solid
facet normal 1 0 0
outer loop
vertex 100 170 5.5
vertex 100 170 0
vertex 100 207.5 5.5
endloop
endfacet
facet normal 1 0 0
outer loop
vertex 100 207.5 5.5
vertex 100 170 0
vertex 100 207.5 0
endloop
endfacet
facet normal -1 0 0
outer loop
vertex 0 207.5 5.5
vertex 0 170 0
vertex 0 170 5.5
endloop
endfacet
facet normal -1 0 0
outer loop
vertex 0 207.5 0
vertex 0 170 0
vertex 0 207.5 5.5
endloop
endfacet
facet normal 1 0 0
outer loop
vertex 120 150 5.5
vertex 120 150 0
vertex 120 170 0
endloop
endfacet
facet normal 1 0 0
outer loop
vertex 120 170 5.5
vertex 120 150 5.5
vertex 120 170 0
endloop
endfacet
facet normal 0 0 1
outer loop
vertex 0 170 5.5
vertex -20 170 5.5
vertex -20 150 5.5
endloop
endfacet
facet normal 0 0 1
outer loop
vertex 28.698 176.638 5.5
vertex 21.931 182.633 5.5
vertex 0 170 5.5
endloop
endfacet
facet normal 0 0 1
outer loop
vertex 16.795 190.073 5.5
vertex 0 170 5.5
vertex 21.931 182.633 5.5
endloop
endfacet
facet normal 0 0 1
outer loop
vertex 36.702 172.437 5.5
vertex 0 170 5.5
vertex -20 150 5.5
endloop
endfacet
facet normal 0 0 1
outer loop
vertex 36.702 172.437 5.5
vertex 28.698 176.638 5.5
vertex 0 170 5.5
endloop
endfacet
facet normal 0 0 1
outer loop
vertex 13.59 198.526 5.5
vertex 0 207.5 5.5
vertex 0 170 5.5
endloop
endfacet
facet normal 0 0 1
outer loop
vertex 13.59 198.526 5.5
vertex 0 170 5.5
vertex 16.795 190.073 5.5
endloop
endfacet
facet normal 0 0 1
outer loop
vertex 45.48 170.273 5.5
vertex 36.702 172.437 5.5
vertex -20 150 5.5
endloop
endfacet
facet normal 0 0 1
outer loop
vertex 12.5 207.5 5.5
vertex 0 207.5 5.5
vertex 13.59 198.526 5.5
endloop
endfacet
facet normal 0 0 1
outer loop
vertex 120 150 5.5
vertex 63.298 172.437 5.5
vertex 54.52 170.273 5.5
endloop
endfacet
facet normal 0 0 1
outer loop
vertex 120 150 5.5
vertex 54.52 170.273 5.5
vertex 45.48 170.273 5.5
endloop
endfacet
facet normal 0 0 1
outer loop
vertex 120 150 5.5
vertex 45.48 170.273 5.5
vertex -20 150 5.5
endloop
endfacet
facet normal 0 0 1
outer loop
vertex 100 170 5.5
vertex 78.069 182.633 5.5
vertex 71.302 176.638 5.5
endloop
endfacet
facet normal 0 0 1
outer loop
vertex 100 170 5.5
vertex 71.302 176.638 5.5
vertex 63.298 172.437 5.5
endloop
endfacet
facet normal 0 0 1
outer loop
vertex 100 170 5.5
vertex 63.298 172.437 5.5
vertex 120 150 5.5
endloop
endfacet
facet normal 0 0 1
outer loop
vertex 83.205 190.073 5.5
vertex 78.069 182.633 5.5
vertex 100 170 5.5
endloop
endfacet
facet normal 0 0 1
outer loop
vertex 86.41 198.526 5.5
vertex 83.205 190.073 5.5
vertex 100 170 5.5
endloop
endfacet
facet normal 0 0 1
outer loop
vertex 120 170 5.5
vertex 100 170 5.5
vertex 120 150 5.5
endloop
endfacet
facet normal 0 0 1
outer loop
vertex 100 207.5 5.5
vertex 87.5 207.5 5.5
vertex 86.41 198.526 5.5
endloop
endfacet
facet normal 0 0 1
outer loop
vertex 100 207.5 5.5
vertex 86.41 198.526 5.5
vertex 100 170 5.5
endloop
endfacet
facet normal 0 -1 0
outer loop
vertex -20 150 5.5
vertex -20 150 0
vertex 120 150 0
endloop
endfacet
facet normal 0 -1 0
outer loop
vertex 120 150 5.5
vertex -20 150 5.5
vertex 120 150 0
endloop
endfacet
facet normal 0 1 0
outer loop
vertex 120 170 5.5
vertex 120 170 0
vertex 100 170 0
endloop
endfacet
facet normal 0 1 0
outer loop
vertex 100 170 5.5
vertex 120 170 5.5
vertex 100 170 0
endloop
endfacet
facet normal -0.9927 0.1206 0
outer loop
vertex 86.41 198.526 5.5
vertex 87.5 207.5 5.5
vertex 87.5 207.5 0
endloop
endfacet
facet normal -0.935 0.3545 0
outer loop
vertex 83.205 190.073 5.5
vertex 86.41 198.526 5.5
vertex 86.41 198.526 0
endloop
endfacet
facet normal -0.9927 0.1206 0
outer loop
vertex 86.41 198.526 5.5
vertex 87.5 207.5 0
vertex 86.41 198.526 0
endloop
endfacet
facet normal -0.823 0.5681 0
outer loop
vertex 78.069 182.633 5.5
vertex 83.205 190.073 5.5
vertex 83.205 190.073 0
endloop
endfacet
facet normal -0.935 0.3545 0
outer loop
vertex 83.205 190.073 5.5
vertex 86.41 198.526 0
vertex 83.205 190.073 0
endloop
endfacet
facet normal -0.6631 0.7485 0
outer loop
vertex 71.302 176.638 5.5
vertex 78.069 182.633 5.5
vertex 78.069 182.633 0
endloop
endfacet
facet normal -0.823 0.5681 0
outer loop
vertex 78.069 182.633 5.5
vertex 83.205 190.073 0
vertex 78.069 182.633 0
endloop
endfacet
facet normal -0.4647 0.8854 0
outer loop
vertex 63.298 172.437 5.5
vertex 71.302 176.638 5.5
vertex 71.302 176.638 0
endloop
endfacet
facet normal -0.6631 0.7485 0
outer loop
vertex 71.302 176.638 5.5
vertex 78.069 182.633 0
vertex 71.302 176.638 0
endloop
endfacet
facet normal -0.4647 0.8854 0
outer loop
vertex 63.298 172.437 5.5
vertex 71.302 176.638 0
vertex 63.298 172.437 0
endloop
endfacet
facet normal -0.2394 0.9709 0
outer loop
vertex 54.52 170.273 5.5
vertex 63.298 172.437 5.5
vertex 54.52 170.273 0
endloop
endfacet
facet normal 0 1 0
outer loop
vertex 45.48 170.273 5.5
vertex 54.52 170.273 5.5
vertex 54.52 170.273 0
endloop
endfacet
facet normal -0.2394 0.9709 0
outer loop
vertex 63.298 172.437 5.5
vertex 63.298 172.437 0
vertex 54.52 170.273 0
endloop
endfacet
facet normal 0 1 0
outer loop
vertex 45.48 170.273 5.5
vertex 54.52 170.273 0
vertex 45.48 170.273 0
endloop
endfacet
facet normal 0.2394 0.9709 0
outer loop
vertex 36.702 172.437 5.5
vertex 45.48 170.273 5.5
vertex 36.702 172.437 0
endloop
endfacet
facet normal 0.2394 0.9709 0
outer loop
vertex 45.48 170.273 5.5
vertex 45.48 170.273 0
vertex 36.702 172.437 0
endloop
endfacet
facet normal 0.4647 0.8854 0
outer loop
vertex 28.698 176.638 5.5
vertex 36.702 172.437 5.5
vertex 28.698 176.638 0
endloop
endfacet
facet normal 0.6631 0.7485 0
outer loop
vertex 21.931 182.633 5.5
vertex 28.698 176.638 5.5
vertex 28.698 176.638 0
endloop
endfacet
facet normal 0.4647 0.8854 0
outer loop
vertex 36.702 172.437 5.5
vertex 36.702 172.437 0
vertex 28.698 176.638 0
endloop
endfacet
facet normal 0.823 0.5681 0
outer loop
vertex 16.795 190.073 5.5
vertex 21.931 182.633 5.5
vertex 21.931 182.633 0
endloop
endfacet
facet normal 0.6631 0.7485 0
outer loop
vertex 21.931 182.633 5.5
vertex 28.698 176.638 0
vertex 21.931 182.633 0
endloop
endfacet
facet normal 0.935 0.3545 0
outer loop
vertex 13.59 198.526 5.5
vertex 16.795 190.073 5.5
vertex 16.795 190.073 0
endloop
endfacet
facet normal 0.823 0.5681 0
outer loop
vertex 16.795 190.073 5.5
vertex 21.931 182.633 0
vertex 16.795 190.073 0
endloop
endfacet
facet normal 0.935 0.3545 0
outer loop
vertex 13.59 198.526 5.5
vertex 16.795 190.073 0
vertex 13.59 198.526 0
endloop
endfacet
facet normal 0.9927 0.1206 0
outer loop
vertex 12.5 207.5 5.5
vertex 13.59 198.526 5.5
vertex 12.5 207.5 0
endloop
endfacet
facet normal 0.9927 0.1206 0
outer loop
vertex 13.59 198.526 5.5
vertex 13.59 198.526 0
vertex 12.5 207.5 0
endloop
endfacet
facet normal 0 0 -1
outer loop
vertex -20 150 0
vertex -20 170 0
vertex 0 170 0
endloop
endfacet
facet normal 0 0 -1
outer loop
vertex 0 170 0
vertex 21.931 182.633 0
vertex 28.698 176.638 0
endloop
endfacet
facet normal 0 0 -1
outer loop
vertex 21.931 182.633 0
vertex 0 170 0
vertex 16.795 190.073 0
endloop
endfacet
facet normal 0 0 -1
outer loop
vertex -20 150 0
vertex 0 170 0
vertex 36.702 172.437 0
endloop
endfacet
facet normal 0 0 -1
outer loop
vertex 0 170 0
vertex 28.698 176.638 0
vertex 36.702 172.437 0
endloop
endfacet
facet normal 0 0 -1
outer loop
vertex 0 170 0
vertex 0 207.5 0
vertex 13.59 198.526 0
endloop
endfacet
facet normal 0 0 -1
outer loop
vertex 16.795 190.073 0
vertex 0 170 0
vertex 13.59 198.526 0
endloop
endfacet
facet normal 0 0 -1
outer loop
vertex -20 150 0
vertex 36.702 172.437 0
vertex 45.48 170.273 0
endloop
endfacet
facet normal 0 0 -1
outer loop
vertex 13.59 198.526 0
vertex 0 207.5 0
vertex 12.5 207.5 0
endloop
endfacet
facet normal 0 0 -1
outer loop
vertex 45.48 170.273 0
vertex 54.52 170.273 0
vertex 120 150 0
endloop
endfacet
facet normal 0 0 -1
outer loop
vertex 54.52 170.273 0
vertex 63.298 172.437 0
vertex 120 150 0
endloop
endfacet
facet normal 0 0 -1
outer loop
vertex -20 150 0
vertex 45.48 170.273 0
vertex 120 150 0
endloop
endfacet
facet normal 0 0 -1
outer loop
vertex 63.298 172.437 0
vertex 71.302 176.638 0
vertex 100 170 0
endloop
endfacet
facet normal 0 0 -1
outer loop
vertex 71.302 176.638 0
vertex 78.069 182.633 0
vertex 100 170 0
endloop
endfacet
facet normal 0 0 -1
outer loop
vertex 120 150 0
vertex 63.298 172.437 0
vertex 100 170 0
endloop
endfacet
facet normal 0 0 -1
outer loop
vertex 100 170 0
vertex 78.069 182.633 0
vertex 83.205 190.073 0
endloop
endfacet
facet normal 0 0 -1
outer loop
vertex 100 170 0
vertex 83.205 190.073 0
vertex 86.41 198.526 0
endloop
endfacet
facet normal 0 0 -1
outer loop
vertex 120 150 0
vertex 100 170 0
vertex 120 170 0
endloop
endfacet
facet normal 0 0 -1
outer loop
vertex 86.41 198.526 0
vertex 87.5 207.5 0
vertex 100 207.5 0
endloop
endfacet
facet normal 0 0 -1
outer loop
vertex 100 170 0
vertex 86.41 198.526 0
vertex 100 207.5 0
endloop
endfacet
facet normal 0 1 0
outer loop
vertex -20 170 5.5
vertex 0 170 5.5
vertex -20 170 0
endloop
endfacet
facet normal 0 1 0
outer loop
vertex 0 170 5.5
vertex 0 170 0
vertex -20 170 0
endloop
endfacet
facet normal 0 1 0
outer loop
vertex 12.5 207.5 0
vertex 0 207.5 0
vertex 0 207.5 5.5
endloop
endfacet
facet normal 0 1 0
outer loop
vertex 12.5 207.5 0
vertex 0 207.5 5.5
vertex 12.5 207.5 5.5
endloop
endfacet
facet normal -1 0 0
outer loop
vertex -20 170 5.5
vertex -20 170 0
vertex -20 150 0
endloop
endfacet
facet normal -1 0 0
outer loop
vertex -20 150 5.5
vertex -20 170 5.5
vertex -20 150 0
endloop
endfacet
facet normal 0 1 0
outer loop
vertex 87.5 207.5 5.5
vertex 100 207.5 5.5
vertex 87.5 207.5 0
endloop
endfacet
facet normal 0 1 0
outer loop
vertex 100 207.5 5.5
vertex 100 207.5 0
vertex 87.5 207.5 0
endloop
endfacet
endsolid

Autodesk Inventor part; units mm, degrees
ref_plane "YZ Plane" through (0, 0, 0) normal (1, 0, 0) x (0, 1, 0)
ref_plane "XZ Plane" through (0, 0, 0) normal (0, 1, 0) x (-1, 0, 0)
ref_plane "XY Plane" through (0, 0, 0) normal (0, 0, 1) x (1, 0, 0)
sketch "Sketch1" plane through (0, 0, 0) normal (0, 0, 1) x (1, 0, 0)
  line L0 (0, 170) -> (100, 170)
  circle A0 centre (50, 207.5) radius 37.5
  line L1 (100, 150) -> (0, 150)
  line L2 (120, 170) -> (-20, 170)
  line L3 (100, 170) -> (100, 207.5)
  line L4 (100, 207.5) -> (87.5, 207.5)
  line L5 (0, 170) -> (0, 207.5)
  line L6 (0, 207.5) -> (12.5, 207.5)
  line L7 (-20, 170) -> (-20, 150)
  line L8 (-20, 150) -> (0, 150)
  line L9 (100, 150) -> (120, 150)
  line L10 (120, 150) -> (120, 170)
  point P0 (0, 0)
  dimension "d0" = 75
  dimension "d1" = 140
extrude "Extrusion1" add sketch "Sketch1" along normal blind 5.5 contours L5 L6 A0 L0 | L0 L2 L10 L9 L1 L8 L7 | A0 L4 L3 L0
properties part number "anillo5"
